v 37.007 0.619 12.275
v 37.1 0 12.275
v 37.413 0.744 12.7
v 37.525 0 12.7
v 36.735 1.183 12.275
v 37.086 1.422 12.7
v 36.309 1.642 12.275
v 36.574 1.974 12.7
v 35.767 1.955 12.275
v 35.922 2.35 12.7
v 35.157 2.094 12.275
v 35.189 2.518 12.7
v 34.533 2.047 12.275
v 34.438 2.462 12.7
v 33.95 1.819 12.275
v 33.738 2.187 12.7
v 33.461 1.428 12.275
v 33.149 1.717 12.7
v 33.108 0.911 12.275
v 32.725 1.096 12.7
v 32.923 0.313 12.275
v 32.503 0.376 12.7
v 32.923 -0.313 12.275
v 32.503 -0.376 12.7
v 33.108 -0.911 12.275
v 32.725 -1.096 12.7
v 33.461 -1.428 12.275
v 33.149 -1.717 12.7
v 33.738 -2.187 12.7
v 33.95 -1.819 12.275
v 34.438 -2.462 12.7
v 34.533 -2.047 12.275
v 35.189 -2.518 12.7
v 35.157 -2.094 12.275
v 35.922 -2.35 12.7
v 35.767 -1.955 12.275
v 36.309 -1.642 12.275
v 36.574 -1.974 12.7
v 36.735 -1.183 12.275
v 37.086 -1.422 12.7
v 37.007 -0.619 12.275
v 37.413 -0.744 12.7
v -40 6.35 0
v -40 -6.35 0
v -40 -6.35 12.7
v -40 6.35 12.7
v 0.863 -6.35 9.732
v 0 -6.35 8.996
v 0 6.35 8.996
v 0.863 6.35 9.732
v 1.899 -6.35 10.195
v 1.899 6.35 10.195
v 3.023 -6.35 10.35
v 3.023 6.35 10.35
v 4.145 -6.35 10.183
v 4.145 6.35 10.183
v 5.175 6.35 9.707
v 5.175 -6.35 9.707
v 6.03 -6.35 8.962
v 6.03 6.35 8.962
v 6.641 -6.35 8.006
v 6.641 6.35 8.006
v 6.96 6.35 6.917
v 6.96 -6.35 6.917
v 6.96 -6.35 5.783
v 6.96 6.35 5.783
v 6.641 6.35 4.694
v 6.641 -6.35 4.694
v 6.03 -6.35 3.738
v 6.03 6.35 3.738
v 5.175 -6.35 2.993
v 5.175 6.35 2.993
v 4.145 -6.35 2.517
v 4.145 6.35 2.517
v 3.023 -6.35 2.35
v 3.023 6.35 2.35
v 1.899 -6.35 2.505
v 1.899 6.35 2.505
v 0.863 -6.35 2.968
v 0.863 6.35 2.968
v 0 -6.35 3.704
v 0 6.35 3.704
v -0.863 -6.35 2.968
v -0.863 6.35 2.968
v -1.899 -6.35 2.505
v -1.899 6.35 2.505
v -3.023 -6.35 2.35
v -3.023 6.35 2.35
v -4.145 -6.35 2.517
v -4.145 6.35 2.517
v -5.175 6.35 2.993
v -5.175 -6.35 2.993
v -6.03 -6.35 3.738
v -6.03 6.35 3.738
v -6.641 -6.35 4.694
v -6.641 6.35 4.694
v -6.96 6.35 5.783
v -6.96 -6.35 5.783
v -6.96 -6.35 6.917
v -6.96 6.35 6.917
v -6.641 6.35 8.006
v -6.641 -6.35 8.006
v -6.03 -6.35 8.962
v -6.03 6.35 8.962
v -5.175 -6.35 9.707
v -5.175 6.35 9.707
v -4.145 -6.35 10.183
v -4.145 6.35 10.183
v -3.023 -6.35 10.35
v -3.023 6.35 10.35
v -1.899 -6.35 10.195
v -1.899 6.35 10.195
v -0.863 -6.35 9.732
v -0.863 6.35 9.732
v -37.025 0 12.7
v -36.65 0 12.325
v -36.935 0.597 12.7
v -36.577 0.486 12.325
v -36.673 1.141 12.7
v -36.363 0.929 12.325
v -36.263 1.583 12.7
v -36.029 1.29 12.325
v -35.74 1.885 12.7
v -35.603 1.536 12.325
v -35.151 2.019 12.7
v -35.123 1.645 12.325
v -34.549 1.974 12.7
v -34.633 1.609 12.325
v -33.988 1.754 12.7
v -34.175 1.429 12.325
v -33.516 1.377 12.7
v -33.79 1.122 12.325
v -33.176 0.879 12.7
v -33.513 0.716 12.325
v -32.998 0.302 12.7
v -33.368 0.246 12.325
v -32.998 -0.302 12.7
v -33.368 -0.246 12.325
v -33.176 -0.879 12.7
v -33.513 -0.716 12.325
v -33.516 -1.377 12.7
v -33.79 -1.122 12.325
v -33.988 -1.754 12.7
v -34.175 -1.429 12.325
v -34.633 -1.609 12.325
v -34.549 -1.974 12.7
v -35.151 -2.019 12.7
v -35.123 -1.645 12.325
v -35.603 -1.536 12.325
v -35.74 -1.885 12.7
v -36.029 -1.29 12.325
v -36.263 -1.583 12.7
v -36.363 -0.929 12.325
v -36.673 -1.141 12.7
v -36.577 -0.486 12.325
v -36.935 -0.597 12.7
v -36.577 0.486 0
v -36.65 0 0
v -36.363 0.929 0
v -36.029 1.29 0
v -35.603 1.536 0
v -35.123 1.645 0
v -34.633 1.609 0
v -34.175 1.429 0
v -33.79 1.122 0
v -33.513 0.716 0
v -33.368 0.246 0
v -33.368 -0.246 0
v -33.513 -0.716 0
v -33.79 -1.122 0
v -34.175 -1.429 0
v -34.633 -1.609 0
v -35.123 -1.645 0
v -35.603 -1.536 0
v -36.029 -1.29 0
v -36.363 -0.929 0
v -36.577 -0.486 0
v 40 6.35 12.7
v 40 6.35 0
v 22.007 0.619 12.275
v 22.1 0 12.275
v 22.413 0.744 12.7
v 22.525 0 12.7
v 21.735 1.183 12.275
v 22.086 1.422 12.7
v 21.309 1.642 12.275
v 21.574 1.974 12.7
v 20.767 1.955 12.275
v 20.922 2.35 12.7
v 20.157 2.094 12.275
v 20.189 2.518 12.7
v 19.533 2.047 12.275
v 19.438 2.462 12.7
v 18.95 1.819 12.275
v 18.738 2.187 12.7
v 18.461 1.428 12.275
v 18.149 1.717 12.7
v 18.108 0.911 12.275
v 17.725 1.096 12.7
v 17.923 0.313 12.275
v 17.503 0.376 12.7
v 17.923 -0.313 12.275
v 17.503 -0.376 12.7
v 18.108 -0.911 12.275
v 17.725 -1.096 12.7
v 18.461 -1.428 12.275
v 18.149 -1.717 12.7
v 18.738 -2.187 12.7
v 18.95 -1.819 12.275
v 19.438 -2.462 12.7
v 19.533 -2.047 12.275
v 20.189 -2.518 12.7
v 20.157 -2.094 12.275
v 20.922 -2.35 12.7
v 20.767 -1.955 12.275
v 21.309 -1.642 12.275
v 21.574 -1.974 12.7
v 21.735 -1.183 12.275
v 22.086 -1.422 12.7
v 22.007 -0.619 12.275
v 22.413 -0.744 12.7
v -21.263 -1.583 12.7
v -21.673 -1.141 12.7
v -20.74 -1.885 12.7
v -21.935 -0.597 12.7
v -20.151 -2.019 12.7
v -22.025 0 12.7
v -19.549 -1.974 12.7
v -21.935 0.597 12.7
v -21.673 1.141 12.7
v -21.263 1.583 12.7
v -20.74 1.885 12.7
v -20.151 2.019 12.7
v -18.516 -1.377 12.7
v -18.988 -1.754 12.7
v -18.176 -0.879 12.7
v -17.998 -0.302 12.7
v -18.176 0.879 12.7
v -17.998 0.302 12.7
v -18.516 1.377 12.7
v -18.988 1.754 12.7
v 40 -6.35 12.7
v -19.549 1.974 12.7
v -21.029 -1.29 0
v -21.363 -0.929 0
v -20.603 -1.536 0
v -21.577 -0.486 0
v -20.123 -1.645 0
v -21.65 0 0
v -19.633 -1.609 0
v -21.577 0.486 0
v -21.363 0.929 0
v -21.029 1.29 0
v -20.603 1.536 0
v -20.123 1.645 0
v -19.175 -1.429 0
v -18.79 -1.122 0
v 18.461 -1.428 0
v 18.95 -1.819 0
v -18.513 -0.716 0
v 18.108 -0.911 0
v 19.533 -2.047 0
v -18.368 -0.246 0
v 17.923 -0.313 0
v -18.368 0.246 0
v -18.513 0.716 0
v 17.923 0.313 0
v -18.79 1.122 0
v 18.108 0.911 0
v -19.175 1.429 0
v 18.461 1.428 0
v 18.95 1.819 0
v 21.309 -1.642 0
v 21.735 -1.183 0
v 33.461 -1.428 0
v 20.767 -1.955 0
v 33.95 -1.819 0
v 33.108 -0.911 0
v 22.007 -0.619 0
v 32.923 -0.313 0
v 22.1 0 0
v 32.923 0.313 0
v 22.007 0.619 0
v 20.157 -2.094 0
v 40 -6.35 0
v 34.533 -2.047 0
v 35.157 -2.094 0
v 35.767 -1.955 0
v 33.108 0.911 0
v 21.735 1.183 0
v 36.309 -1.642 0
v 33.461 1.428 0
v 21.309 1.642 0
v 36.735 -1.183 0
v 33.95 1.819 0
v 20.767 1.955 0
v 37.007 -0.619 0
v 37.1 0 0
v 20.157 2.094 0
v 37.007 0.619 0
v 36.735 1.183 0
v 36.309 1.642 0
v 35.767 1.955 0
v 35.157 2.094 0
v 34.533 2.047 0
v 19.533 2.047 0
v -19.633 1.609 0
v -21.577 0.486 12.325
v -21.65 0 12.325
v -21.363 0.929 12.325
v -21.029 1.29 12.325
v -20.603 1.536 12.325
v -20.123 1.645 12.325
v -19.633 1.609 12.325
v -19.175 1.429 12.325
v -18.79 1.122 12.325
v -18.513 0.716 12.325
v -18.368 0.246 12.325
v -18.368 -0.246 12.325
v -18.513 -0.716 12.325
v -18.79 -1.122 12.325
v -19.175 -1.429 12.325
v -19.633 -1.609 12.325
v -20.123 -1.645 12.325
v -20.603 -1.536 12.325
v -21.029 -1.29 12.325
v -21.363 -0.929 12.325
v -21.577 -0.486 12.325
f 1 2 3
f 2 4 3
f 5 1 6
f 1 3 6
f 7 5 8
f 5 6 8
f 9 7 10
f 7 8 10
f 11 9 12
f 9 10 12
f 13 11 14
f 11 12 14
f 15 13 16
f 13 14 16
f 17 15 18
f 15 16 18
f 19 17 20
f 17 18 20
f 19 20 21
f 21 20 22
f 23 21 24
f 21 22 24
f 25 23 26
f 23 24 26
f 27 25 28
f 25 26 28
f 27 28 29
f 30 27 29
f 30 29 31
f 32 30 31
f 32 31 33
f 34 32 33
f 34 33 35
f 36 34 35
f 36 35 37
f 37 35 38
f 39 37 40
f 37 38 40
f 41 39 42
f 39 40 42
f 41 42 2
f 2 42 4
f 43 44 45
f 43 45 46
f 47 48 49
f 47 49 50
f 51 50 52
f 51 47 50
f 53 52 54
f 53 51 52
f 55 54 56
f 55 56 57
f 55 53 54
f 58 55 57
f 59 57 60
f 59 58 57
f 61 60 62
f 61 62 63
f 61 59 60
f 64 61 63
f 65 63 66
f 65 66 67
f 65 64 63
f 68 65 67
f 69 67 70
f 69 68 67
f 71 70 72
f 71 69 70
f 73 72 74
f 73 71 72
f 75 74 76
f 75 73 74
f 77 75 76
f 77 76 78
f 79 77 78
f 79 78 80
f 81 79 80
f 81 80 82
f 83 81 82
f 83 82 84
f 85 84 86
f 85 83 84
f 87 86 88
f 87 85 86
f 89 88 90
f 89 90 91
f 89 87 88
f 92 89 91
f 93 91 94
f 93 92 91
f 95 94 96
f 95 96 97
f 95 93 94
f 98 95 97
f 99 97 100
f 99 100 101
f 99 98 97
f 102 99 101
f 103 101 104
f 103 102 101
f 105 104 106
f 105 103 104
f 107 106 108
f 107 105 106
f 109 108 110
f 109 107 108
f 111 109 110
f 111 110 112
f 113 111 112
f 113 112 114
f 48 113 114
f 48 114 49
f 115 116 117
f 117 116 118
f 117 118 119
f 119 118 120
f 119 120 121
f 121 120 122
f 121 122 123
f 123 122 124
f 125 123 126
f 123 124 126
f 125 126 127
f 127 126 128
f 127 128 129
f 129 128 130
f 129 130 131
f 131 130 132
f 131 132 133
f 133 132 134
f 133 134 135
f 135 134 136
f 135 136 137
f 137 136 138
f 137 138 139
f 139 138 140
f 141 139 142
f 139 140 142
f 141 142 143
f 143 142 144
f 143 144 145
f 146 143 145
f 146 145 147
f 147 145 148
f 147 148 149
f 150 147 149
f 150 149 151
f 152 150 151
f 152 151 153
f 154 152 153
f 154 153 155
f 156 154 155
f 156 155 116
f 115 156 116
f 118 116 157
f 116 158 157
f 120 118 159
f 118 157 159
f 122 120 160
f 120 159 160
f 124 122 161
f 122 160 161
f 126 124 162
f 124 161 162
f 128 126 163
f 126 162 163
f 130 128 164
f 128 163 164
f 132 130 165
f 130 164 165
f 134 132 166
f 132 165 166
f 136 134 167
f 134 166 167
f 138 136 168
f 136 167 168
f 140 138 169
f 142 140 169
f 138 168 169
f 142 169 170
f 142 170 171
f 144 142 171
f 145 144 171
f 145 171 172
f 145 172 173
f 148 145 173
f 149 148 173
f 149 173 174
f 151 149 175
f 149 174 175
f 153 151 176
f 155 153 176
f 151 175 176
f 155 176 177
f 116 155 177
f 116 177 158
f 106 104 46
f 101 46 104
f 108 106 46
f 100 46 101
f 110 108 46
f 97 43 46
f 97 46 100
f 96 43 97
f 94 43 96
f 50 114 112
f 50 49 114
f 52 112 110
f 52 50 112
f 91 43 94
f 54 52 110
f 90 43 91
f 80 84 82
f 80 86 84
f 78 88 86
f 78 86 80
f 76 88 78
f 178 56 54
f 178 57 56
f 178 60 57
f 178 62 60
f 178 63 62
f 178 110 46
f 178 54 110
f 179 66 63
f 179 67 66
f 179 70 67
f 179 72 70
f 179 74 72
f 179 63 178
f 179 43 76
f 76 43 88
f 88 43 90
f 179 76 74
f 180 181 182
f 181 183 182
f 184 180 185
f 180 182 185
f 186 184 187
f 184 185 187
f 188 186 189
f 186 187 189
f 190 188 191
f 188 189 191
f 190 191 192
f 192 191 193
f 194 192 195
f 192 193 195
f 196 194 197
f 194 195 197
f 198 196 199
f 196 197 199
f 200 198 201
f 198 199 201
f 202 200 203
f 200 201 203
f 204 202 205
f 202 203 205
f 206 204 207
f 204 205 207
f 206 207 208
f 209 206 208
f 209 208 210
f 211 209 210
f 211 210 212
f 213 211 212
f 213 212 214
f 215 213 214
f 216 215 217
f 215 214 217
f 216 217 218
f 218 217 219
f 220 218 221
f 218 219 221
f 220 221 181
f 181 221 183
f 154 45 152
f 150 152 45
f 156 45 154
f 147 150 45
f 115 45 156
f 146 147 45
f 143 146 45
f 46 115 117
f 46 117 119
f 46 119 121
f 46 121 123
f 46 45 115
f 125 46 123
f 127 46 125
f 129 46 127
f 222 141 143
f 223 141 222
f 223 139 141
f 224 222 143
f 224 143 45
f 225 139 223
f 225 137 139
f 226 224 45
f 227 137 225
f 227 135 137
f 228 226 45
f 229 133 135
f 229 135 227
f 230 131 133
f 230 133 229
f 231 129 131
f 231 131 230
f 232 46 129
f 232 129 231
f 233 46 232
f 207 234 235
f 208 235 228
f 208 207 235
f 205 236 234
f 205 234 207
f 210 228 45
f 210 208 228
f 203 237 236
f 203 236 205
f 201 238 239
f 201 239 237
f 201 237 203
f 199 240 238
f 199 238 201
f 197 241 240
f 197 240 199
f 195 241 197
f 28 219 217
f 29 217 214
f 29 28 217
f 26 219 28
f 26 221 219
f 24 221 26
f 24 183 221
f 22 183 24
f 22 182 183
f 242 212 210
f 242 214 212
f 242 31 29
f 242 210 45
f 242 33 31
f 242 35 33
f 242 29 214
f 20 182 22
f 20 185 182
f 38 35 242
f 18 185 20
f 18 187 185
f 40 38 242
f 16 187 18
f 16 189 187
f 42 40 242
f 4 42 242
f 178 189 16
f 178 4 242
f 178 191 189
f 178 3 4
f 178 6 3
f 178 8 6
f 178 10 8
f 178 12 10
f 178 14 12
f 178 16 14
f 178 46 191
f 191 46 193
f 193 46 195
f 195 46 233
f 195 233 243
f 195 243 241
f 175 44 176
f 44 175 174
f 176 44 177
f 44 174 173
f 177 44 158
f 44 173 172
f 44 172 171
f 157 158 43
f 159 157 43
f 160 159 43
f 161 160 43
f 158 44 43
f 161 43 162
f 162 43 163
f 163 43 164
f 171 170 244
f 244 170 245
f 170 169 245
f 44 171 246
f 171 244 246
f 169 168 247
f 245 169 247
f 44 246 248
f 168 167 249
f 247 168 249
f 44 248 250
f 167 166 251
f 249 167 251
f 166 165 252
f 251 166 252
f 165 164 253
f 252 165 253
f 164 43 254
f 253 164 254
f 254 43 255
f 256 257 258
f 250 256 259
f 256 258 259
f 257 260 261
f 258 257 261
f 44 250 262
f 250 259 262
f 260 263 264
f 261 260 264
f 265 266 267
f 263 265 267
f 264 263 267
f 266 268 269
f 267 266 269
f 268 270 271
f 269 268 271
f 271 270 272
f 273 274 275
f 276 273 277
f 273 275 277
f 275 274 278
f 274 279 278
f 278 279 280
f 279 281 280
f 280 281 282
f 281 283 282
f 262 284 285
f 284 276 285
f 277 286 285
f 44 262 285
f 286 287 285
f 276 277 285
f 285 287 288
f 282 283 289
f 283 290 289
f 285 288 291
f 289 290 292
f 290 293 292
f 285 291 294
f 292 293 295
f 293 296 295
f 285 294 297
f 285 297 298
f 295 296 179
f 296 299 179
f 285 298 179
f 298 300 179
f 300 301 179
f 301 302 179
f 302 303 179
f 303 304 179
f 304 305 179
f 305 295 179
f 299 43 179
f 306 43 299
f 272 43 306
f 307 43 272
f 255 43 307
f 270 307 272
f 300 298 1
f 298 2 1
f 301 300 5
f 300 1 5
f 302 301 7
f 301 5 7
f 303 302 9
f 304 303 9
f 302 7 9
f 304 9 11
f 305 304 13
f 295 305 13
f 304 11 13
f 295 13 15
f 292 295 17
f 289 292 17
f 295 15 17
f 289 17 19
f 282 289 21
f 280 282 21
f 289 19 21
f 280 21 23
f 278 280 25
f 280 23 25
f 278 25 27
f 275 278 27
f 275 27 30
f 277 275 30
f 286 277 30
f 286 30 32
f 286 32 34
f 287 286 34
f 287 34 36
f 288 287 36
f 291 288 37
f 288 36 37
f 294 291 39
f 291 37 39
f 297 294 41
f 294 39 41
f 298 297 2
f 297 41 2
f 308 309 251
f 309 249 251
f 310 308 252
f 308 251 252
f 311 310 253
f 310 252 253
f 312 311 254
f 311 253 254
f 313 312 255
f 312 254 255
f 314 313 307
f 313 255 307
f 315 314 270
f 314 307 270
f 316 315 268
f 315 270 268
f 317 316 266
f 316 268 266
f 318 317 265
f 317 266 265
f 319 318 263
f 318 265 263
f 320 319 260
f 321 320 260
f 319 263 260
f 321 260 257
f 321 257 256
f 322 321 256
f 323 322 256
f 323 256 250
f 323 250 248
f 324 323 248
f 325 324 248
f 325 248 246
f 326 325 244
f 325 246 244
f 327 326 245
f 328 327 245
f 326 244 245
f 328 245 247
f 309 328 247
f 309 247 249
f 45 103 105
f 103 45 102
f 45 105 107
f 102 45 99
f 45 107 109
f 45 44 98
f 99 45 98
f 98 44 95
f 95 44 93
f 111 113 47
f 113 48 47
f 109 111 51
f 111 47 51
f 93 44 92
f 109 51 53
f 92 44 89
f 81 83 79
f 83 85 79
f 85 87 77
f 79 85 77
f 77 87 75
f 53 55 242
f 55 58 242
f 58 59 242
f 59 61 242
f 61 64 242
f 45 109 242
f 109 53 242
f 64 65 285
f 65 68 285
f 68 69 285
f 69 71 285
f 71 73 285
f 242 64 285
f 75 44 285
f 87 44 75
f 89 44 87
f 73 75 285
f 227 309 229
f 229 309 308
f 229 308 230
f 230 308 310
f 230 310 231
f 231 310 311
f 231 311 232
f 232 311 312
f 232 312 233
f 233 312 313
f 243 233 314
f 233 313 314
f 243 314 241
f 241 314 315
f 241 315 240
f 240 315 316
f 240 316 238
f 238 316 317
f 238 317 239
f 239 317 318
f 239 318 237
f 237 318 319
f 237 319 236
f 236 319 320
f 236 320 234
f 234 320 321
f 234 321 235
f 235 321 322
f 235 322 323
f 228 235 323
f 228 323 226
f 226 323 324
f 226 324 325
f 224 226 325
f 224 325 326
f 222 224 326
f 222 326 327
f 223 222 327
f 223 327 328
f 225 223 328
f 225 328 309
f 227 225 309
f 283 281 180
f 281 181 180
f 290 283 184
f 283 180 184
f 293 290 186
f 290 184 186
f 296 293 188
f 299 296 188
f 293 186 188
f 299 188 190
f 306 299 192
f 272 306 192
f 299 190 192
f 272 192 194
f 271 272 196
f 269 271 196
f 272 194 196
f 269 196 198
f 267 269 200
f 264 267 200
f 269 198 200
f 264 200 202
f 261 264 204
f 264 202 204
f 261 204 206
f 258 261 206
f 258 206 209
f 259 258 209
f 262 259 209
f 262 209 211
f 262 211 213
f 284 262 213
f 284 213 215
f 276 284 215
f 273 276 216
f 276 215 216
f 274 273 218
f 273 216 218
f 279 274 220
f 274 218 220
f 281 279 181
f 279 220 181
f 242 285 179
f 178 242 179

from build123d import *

# Parameters (mm, degrees)
ESQUISSE1_W                 = 80
ESQUISSE1_H                 = 12.7
BOSS_EXTRU_1_DEPTH          = 12.7
TROU_TARAUD_M41_D           = 3.3
TROU_TARAUD_M41_CSINK_D     = 4.05
TROU_TARAUD_M41_CSINK_ANGLE = 90
ENL_V_START                 = -6.35
ENL_V_MAT_EXTRU_1_DEPTH     = 12.7


# Read off the part's stored shape, not the designer's step: Trou taraudé M51
with BuildPart() as part:
    # Esquisse1 → Boss.-Extru.1 (new body)
    with BuildSketch(Plane.XY):
        Rectangle(ESQUISSE1_W, ESQUISSE1_H)
    extrude(amount=BOSS_EXTRU_1_DEPTH)

    # Trou taraudé M41 (through all)
    with Locations(Plane.XY.offset(12.7)):
        with Locations((-35, 0), (-20, 0)):
            CounterSinkHole(TROU_TARAUD_M41_D / 2, TROU_TARAUD_M41_CSINK_D / 2, counter_sink_angle=TROU_TARAUD_M41_CSINK_ANGLE)

    # Esquisse4 → Enlèv. mat.-Extru.1 (cut)
    with BuildSketch(Plane(origin=(0, 0, 0), x_dir=(1, 0, 0), z_dir=(0, 1, 0)).offset(ENL_V_START)):
        with BuildLine():
            ThreePointArc((0, -3.704248689), (-7, -6.35), (0, -8.995751311))
            ThreePointArc((0, -8.995751311), (7, -6.35), (0, -3.704248689))
        make_face()
    extrude(amount=ENL_V_MAT_EXTRU_1_DEPTH, mode=Mode.SUBTRACT)

    # Trou taraudé M51 outline → Trou taraudé M51 (revolve, cut)
    with BuildSketch(Plane(origin=(35, 0, 0), x_dir=(1, 0, 0), z_dir=(0, -1, 0))):
        Polygon((0, 0), (2.1, 0), (2.1, 12.275), (2.525, 12.7), (0, 12.7), align=None)
    revolve(axis=Axis((35, 0, 0), (0, 0, 1)), mode=Mode.SUBTRACT)

    # Trou taraud_ M51 2 outline → Trou taraud_ M51 2 (revolve, cut)
    with BuildSketch(Plane(origin=(20, 0, 0), x_dir=(1, 0, 0), z_dir=(0, -1, 0))):
        Polygon((0, 0), (2.1, 0), (2.1, 12.275), (2.525, 12.7), (0, 12.7), align=None)
    revolve(axis=Axis((20, 0, 0), (0, 0, 1)), mode=Mode.SUBTRACT)


solid = part.part
